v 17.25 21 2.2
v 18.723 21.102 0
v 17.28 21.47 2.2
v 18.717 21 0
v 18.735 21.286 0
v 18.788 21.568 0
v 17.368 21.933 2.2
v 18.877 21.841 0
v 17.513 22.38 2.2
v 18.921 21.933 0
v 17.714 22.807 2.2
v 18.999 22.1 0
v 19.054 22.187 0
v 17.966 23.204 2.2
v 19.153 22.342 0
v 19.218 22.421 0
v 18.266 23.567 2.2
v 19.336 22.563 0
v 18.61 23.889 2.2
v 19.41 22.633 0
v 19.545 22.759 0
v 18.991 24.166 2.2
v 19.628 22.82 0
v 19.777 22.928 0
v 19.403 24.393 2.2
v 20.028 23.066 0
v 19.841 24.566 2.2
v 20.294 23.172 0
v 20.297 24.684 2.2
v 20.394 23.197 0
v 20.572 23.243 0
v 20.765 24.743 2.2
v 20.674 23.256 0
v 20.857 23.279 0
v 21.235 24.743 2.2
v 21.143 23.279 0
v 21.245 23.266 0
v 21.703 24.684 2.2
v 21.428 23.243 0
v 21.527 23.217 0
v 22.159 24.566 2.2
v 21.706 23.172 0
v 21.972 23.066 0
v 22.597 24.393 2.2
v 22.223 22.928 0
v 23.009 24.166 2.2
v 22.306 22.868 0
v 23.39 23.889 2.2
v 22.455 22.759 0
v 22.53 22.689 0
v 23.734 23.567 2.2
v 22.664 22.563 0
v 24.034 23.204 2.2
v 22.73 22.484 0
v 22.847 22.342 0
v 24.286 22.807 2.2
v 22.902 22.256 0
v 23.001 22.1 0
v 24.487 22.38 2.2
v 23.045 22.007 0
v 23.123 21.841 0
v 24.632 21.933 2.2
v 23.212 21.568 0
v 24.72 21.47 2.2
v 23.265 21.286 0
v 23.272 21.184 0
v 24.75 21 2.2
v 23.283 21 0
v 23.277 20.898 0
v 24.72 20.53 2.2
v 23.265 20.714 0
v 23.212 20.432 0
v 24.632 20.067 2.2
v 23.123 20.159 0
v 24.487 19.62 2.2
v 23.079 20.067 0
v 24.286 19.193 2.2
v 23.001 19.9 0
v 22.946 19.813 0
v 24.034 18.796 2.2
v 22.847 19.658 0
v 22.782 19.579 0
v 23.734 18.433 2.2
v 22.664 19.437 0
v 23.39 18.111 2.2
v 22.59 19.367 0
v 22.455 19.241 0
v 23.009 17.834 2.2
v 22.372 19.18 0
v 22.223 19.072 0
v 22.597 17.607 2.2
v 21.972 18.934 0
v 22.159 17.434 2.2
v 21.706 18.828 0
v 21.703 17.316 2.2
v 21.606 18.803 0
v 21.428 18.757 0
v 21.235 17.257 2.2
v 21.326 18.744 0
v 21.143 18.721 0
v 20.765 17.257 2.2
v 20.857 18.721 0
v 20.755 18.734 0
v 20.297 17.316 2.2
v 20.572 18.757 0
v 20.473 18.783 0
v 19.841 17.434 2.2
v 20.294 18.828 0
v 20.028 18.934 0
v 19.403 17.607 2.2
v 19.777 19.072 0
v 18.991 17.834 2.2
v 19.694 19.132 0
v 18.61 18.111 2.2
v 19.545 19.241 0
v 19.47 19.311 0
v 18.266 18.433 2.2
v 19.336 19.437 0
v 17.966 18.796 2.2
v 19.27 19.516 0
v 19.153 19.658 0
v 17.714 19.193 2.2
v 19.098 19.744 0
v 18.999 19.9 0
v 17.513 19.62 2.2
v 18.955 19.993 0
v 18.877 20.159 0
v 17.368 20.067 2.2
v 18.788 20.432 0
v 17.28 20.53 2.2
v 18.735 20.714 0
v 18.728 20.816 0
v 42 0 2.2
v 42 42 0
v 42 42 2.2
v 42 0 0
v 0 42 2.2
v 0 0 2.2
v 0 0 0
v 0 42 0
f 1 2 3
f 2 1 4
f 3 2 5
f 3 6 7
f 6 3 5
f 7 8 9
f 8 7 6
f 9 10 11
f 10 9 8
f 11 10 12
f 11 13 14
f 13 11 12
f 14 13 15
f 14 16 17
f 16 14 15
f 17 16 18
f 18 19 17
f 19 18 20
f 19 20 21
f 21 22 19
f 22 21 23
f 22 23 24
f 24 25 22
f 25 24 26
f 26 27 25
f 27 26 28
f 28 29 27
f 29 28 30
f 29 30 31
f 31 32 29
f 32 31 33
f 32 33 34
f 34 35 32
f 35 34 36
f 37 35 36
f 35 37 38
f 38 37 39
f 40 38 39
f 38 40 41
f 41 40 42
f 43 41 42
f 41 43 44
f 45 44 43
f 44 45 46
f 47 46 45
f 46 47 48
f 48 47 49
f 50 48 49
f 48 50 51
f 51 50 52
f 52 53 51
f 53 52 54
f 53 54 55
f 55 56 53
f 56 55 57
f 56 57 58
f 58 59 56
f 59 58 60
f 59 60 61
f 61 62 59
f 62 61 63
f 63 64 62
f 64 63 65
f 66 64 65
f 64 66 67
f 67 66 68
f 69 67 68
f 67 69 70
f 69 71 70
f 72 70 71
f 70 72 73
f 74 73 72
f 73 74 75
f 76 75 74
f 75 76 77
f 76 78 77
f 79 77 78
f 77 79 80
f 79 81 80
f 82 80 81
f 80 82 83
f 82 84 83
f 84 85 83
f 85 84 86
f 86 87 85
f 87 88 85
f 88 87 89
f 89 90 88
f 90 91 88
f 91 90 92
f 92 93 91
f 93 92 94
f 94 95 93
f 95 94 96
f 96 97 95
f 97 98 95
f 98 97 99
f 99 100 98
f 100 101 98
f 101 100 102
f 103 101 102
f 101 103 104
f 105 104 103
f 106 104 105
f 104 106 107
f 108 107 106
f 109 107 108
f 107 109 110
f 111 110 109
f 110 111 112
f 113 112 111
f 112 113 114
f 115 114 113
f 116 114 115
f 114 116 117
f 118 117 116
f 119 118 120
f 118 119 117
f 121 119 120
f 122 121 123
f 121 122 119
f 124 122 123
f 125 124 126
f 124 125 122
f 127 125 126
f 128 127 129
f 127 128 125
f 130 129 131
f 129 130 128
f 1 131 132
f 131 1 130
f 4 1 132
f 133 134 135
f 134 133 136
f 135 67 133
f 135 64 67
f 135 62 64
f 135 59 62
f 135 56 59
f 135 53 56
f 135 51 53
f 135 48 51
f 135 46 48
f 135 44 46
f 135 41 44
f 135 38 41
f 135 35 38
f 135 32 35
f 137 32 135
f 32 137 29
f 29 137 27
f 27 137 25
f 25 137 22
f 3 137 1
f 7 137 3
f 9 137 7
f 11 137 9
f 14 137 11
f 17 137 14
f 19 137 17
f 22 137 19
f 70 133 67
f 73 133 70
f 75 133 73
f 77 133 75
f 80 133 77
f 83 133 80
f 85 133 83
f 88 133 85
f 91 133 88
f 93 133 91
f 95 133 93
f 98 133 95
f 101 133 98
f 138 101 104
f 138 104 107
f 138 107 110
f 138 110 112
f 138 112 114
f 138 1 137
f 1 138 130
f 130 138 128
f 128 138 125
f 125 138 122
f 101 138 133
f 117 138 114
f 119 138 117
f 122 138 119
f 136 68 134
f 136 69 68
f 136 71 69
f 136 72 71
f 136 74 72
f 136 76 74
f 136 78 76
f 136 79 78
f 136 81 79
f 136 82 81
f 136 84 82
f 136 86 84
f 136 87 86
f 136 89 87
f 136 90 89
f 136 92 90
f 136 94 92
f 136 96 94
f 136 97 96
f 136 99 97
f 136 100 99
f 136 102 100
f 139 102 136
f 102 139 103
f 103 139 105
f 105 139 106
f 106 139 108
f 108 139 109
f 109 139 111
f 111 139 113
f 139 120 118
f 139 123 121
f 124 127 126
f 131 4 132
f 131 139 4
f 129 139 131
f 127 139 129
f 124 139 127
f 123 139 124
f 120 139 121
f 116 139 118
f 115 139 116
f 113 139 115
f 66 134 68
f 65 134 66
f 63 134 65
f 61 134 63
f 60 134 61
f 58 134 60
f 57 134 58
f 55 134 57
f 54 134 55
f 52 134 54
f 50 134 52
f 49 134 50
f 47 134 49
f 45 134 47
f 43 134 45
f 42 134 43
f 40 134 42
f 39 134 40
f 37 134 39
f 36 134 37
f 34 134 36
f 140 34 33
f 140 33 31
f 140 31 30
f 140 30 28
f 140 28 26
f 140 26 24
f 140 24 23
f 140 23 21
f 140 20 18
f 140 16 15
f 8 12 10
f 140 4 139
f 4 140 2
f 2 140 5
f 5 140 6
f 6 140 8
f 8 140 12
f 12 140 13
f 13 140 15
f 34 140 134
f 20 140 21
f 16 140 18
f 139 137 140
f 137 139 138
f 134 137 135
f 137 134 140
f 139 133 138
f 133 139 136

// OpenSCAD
// file: Parts/Screw.scad
// created by IndiePandaaaaa | Lukas

$fn = 50;

function cone_diameter(diameter) = diameter * 2;

function cone_diameter_cutout(diameter) = diameter * 2 + 0.5;

function cone_height(diameter) = diameter * 0.75;

module screw(diameter, length = 12, cutout_sample = false) {
  module base_model(diameter, length, cone_height, cone_diameter, offset = 0) {
    rotate_extrude() {
      polygon([
          [0, 0],
          [(diameter + offset) / 2, 0],
          [(diameter + offset) / 2, (length + offset) - (cone_height + offset)],
          [(cone_diameter + offset) / 2, length + offset],
          [0, length + offset],
        ]);
    }
  }

  if (length < diameter) {
    echo("Screw is too short");
    length = diameter + 5;
    echo("New length is: ", length);
  }

  if (!cutout_sample) {
    translate([0, 0, -length])
      difference() {
        base_model(diameter, length, cone_height(diameter), cone_diameter(diameter));

        // top cross part
        translate([0, 0, length - (cone_height(diameter) - diameter / 2) + .1])
          difference() {
            rotate([0, 0, 45])
              rotate_extrude() {
                polygon([
                    [0, 0],
                    [diameter * 1.4 / 2, 0],
                    [cone_diameter(diameter) / 3, cone_height(diameter) - diameter / 2],
                    [0, cone_height(diameter) - diameter / 2],
                  ]);
              }
            for (i = [0 : 1 : 3]) {
              rotate([0, 0, 90 * i])
                translate([diameter / 3.18 / 2, diameter / 3.18 / 2, 0]) cube(cone_height(diameter));
            }
          }
      }
  } else {
    offset = 0;
    diameter = cone_diameter_cutout(diameter) / 2;  // is duplicated by function, used to reduce error
    translate([0, 0, -length - offset / 2]) {
      base_model(diameter, length, cone_height(diameter), cone_diameter(diameter), offset);
      translate([0, 0, length]) cylinder(r = diameter, h = 50);
    }
  }
}

module screw_corehole(diameter_screw, diameter_core, unthreaded_length, length = 12) {
  union() {
    screw(diameter_screw, unthreaded_length, true);
    translate([0, 0, -length]) cylinder(d = diameter_core, h = length - unthreaded_length + .1);
  }
}

translate([20, 0, 0]) screw(3.5, cutout_sample = false);
screw_corehole(diameter_screw = 3, diameter_core = 2.5, unthreaded_length = 15, length = 20);
// main file
// created by IndiePandaaaaa|Lukas

use <Parts/Screw.scad>

SCREW_OD = 3.5;
SIZE = 42;
HEIGHT = 2.2;

difference() {
  cube([42, 42, 2.2]);
  translate([SIZE / 2, SIZE / 2, HEIGHT]) screw(SCREW_OD, 12, true);
}
